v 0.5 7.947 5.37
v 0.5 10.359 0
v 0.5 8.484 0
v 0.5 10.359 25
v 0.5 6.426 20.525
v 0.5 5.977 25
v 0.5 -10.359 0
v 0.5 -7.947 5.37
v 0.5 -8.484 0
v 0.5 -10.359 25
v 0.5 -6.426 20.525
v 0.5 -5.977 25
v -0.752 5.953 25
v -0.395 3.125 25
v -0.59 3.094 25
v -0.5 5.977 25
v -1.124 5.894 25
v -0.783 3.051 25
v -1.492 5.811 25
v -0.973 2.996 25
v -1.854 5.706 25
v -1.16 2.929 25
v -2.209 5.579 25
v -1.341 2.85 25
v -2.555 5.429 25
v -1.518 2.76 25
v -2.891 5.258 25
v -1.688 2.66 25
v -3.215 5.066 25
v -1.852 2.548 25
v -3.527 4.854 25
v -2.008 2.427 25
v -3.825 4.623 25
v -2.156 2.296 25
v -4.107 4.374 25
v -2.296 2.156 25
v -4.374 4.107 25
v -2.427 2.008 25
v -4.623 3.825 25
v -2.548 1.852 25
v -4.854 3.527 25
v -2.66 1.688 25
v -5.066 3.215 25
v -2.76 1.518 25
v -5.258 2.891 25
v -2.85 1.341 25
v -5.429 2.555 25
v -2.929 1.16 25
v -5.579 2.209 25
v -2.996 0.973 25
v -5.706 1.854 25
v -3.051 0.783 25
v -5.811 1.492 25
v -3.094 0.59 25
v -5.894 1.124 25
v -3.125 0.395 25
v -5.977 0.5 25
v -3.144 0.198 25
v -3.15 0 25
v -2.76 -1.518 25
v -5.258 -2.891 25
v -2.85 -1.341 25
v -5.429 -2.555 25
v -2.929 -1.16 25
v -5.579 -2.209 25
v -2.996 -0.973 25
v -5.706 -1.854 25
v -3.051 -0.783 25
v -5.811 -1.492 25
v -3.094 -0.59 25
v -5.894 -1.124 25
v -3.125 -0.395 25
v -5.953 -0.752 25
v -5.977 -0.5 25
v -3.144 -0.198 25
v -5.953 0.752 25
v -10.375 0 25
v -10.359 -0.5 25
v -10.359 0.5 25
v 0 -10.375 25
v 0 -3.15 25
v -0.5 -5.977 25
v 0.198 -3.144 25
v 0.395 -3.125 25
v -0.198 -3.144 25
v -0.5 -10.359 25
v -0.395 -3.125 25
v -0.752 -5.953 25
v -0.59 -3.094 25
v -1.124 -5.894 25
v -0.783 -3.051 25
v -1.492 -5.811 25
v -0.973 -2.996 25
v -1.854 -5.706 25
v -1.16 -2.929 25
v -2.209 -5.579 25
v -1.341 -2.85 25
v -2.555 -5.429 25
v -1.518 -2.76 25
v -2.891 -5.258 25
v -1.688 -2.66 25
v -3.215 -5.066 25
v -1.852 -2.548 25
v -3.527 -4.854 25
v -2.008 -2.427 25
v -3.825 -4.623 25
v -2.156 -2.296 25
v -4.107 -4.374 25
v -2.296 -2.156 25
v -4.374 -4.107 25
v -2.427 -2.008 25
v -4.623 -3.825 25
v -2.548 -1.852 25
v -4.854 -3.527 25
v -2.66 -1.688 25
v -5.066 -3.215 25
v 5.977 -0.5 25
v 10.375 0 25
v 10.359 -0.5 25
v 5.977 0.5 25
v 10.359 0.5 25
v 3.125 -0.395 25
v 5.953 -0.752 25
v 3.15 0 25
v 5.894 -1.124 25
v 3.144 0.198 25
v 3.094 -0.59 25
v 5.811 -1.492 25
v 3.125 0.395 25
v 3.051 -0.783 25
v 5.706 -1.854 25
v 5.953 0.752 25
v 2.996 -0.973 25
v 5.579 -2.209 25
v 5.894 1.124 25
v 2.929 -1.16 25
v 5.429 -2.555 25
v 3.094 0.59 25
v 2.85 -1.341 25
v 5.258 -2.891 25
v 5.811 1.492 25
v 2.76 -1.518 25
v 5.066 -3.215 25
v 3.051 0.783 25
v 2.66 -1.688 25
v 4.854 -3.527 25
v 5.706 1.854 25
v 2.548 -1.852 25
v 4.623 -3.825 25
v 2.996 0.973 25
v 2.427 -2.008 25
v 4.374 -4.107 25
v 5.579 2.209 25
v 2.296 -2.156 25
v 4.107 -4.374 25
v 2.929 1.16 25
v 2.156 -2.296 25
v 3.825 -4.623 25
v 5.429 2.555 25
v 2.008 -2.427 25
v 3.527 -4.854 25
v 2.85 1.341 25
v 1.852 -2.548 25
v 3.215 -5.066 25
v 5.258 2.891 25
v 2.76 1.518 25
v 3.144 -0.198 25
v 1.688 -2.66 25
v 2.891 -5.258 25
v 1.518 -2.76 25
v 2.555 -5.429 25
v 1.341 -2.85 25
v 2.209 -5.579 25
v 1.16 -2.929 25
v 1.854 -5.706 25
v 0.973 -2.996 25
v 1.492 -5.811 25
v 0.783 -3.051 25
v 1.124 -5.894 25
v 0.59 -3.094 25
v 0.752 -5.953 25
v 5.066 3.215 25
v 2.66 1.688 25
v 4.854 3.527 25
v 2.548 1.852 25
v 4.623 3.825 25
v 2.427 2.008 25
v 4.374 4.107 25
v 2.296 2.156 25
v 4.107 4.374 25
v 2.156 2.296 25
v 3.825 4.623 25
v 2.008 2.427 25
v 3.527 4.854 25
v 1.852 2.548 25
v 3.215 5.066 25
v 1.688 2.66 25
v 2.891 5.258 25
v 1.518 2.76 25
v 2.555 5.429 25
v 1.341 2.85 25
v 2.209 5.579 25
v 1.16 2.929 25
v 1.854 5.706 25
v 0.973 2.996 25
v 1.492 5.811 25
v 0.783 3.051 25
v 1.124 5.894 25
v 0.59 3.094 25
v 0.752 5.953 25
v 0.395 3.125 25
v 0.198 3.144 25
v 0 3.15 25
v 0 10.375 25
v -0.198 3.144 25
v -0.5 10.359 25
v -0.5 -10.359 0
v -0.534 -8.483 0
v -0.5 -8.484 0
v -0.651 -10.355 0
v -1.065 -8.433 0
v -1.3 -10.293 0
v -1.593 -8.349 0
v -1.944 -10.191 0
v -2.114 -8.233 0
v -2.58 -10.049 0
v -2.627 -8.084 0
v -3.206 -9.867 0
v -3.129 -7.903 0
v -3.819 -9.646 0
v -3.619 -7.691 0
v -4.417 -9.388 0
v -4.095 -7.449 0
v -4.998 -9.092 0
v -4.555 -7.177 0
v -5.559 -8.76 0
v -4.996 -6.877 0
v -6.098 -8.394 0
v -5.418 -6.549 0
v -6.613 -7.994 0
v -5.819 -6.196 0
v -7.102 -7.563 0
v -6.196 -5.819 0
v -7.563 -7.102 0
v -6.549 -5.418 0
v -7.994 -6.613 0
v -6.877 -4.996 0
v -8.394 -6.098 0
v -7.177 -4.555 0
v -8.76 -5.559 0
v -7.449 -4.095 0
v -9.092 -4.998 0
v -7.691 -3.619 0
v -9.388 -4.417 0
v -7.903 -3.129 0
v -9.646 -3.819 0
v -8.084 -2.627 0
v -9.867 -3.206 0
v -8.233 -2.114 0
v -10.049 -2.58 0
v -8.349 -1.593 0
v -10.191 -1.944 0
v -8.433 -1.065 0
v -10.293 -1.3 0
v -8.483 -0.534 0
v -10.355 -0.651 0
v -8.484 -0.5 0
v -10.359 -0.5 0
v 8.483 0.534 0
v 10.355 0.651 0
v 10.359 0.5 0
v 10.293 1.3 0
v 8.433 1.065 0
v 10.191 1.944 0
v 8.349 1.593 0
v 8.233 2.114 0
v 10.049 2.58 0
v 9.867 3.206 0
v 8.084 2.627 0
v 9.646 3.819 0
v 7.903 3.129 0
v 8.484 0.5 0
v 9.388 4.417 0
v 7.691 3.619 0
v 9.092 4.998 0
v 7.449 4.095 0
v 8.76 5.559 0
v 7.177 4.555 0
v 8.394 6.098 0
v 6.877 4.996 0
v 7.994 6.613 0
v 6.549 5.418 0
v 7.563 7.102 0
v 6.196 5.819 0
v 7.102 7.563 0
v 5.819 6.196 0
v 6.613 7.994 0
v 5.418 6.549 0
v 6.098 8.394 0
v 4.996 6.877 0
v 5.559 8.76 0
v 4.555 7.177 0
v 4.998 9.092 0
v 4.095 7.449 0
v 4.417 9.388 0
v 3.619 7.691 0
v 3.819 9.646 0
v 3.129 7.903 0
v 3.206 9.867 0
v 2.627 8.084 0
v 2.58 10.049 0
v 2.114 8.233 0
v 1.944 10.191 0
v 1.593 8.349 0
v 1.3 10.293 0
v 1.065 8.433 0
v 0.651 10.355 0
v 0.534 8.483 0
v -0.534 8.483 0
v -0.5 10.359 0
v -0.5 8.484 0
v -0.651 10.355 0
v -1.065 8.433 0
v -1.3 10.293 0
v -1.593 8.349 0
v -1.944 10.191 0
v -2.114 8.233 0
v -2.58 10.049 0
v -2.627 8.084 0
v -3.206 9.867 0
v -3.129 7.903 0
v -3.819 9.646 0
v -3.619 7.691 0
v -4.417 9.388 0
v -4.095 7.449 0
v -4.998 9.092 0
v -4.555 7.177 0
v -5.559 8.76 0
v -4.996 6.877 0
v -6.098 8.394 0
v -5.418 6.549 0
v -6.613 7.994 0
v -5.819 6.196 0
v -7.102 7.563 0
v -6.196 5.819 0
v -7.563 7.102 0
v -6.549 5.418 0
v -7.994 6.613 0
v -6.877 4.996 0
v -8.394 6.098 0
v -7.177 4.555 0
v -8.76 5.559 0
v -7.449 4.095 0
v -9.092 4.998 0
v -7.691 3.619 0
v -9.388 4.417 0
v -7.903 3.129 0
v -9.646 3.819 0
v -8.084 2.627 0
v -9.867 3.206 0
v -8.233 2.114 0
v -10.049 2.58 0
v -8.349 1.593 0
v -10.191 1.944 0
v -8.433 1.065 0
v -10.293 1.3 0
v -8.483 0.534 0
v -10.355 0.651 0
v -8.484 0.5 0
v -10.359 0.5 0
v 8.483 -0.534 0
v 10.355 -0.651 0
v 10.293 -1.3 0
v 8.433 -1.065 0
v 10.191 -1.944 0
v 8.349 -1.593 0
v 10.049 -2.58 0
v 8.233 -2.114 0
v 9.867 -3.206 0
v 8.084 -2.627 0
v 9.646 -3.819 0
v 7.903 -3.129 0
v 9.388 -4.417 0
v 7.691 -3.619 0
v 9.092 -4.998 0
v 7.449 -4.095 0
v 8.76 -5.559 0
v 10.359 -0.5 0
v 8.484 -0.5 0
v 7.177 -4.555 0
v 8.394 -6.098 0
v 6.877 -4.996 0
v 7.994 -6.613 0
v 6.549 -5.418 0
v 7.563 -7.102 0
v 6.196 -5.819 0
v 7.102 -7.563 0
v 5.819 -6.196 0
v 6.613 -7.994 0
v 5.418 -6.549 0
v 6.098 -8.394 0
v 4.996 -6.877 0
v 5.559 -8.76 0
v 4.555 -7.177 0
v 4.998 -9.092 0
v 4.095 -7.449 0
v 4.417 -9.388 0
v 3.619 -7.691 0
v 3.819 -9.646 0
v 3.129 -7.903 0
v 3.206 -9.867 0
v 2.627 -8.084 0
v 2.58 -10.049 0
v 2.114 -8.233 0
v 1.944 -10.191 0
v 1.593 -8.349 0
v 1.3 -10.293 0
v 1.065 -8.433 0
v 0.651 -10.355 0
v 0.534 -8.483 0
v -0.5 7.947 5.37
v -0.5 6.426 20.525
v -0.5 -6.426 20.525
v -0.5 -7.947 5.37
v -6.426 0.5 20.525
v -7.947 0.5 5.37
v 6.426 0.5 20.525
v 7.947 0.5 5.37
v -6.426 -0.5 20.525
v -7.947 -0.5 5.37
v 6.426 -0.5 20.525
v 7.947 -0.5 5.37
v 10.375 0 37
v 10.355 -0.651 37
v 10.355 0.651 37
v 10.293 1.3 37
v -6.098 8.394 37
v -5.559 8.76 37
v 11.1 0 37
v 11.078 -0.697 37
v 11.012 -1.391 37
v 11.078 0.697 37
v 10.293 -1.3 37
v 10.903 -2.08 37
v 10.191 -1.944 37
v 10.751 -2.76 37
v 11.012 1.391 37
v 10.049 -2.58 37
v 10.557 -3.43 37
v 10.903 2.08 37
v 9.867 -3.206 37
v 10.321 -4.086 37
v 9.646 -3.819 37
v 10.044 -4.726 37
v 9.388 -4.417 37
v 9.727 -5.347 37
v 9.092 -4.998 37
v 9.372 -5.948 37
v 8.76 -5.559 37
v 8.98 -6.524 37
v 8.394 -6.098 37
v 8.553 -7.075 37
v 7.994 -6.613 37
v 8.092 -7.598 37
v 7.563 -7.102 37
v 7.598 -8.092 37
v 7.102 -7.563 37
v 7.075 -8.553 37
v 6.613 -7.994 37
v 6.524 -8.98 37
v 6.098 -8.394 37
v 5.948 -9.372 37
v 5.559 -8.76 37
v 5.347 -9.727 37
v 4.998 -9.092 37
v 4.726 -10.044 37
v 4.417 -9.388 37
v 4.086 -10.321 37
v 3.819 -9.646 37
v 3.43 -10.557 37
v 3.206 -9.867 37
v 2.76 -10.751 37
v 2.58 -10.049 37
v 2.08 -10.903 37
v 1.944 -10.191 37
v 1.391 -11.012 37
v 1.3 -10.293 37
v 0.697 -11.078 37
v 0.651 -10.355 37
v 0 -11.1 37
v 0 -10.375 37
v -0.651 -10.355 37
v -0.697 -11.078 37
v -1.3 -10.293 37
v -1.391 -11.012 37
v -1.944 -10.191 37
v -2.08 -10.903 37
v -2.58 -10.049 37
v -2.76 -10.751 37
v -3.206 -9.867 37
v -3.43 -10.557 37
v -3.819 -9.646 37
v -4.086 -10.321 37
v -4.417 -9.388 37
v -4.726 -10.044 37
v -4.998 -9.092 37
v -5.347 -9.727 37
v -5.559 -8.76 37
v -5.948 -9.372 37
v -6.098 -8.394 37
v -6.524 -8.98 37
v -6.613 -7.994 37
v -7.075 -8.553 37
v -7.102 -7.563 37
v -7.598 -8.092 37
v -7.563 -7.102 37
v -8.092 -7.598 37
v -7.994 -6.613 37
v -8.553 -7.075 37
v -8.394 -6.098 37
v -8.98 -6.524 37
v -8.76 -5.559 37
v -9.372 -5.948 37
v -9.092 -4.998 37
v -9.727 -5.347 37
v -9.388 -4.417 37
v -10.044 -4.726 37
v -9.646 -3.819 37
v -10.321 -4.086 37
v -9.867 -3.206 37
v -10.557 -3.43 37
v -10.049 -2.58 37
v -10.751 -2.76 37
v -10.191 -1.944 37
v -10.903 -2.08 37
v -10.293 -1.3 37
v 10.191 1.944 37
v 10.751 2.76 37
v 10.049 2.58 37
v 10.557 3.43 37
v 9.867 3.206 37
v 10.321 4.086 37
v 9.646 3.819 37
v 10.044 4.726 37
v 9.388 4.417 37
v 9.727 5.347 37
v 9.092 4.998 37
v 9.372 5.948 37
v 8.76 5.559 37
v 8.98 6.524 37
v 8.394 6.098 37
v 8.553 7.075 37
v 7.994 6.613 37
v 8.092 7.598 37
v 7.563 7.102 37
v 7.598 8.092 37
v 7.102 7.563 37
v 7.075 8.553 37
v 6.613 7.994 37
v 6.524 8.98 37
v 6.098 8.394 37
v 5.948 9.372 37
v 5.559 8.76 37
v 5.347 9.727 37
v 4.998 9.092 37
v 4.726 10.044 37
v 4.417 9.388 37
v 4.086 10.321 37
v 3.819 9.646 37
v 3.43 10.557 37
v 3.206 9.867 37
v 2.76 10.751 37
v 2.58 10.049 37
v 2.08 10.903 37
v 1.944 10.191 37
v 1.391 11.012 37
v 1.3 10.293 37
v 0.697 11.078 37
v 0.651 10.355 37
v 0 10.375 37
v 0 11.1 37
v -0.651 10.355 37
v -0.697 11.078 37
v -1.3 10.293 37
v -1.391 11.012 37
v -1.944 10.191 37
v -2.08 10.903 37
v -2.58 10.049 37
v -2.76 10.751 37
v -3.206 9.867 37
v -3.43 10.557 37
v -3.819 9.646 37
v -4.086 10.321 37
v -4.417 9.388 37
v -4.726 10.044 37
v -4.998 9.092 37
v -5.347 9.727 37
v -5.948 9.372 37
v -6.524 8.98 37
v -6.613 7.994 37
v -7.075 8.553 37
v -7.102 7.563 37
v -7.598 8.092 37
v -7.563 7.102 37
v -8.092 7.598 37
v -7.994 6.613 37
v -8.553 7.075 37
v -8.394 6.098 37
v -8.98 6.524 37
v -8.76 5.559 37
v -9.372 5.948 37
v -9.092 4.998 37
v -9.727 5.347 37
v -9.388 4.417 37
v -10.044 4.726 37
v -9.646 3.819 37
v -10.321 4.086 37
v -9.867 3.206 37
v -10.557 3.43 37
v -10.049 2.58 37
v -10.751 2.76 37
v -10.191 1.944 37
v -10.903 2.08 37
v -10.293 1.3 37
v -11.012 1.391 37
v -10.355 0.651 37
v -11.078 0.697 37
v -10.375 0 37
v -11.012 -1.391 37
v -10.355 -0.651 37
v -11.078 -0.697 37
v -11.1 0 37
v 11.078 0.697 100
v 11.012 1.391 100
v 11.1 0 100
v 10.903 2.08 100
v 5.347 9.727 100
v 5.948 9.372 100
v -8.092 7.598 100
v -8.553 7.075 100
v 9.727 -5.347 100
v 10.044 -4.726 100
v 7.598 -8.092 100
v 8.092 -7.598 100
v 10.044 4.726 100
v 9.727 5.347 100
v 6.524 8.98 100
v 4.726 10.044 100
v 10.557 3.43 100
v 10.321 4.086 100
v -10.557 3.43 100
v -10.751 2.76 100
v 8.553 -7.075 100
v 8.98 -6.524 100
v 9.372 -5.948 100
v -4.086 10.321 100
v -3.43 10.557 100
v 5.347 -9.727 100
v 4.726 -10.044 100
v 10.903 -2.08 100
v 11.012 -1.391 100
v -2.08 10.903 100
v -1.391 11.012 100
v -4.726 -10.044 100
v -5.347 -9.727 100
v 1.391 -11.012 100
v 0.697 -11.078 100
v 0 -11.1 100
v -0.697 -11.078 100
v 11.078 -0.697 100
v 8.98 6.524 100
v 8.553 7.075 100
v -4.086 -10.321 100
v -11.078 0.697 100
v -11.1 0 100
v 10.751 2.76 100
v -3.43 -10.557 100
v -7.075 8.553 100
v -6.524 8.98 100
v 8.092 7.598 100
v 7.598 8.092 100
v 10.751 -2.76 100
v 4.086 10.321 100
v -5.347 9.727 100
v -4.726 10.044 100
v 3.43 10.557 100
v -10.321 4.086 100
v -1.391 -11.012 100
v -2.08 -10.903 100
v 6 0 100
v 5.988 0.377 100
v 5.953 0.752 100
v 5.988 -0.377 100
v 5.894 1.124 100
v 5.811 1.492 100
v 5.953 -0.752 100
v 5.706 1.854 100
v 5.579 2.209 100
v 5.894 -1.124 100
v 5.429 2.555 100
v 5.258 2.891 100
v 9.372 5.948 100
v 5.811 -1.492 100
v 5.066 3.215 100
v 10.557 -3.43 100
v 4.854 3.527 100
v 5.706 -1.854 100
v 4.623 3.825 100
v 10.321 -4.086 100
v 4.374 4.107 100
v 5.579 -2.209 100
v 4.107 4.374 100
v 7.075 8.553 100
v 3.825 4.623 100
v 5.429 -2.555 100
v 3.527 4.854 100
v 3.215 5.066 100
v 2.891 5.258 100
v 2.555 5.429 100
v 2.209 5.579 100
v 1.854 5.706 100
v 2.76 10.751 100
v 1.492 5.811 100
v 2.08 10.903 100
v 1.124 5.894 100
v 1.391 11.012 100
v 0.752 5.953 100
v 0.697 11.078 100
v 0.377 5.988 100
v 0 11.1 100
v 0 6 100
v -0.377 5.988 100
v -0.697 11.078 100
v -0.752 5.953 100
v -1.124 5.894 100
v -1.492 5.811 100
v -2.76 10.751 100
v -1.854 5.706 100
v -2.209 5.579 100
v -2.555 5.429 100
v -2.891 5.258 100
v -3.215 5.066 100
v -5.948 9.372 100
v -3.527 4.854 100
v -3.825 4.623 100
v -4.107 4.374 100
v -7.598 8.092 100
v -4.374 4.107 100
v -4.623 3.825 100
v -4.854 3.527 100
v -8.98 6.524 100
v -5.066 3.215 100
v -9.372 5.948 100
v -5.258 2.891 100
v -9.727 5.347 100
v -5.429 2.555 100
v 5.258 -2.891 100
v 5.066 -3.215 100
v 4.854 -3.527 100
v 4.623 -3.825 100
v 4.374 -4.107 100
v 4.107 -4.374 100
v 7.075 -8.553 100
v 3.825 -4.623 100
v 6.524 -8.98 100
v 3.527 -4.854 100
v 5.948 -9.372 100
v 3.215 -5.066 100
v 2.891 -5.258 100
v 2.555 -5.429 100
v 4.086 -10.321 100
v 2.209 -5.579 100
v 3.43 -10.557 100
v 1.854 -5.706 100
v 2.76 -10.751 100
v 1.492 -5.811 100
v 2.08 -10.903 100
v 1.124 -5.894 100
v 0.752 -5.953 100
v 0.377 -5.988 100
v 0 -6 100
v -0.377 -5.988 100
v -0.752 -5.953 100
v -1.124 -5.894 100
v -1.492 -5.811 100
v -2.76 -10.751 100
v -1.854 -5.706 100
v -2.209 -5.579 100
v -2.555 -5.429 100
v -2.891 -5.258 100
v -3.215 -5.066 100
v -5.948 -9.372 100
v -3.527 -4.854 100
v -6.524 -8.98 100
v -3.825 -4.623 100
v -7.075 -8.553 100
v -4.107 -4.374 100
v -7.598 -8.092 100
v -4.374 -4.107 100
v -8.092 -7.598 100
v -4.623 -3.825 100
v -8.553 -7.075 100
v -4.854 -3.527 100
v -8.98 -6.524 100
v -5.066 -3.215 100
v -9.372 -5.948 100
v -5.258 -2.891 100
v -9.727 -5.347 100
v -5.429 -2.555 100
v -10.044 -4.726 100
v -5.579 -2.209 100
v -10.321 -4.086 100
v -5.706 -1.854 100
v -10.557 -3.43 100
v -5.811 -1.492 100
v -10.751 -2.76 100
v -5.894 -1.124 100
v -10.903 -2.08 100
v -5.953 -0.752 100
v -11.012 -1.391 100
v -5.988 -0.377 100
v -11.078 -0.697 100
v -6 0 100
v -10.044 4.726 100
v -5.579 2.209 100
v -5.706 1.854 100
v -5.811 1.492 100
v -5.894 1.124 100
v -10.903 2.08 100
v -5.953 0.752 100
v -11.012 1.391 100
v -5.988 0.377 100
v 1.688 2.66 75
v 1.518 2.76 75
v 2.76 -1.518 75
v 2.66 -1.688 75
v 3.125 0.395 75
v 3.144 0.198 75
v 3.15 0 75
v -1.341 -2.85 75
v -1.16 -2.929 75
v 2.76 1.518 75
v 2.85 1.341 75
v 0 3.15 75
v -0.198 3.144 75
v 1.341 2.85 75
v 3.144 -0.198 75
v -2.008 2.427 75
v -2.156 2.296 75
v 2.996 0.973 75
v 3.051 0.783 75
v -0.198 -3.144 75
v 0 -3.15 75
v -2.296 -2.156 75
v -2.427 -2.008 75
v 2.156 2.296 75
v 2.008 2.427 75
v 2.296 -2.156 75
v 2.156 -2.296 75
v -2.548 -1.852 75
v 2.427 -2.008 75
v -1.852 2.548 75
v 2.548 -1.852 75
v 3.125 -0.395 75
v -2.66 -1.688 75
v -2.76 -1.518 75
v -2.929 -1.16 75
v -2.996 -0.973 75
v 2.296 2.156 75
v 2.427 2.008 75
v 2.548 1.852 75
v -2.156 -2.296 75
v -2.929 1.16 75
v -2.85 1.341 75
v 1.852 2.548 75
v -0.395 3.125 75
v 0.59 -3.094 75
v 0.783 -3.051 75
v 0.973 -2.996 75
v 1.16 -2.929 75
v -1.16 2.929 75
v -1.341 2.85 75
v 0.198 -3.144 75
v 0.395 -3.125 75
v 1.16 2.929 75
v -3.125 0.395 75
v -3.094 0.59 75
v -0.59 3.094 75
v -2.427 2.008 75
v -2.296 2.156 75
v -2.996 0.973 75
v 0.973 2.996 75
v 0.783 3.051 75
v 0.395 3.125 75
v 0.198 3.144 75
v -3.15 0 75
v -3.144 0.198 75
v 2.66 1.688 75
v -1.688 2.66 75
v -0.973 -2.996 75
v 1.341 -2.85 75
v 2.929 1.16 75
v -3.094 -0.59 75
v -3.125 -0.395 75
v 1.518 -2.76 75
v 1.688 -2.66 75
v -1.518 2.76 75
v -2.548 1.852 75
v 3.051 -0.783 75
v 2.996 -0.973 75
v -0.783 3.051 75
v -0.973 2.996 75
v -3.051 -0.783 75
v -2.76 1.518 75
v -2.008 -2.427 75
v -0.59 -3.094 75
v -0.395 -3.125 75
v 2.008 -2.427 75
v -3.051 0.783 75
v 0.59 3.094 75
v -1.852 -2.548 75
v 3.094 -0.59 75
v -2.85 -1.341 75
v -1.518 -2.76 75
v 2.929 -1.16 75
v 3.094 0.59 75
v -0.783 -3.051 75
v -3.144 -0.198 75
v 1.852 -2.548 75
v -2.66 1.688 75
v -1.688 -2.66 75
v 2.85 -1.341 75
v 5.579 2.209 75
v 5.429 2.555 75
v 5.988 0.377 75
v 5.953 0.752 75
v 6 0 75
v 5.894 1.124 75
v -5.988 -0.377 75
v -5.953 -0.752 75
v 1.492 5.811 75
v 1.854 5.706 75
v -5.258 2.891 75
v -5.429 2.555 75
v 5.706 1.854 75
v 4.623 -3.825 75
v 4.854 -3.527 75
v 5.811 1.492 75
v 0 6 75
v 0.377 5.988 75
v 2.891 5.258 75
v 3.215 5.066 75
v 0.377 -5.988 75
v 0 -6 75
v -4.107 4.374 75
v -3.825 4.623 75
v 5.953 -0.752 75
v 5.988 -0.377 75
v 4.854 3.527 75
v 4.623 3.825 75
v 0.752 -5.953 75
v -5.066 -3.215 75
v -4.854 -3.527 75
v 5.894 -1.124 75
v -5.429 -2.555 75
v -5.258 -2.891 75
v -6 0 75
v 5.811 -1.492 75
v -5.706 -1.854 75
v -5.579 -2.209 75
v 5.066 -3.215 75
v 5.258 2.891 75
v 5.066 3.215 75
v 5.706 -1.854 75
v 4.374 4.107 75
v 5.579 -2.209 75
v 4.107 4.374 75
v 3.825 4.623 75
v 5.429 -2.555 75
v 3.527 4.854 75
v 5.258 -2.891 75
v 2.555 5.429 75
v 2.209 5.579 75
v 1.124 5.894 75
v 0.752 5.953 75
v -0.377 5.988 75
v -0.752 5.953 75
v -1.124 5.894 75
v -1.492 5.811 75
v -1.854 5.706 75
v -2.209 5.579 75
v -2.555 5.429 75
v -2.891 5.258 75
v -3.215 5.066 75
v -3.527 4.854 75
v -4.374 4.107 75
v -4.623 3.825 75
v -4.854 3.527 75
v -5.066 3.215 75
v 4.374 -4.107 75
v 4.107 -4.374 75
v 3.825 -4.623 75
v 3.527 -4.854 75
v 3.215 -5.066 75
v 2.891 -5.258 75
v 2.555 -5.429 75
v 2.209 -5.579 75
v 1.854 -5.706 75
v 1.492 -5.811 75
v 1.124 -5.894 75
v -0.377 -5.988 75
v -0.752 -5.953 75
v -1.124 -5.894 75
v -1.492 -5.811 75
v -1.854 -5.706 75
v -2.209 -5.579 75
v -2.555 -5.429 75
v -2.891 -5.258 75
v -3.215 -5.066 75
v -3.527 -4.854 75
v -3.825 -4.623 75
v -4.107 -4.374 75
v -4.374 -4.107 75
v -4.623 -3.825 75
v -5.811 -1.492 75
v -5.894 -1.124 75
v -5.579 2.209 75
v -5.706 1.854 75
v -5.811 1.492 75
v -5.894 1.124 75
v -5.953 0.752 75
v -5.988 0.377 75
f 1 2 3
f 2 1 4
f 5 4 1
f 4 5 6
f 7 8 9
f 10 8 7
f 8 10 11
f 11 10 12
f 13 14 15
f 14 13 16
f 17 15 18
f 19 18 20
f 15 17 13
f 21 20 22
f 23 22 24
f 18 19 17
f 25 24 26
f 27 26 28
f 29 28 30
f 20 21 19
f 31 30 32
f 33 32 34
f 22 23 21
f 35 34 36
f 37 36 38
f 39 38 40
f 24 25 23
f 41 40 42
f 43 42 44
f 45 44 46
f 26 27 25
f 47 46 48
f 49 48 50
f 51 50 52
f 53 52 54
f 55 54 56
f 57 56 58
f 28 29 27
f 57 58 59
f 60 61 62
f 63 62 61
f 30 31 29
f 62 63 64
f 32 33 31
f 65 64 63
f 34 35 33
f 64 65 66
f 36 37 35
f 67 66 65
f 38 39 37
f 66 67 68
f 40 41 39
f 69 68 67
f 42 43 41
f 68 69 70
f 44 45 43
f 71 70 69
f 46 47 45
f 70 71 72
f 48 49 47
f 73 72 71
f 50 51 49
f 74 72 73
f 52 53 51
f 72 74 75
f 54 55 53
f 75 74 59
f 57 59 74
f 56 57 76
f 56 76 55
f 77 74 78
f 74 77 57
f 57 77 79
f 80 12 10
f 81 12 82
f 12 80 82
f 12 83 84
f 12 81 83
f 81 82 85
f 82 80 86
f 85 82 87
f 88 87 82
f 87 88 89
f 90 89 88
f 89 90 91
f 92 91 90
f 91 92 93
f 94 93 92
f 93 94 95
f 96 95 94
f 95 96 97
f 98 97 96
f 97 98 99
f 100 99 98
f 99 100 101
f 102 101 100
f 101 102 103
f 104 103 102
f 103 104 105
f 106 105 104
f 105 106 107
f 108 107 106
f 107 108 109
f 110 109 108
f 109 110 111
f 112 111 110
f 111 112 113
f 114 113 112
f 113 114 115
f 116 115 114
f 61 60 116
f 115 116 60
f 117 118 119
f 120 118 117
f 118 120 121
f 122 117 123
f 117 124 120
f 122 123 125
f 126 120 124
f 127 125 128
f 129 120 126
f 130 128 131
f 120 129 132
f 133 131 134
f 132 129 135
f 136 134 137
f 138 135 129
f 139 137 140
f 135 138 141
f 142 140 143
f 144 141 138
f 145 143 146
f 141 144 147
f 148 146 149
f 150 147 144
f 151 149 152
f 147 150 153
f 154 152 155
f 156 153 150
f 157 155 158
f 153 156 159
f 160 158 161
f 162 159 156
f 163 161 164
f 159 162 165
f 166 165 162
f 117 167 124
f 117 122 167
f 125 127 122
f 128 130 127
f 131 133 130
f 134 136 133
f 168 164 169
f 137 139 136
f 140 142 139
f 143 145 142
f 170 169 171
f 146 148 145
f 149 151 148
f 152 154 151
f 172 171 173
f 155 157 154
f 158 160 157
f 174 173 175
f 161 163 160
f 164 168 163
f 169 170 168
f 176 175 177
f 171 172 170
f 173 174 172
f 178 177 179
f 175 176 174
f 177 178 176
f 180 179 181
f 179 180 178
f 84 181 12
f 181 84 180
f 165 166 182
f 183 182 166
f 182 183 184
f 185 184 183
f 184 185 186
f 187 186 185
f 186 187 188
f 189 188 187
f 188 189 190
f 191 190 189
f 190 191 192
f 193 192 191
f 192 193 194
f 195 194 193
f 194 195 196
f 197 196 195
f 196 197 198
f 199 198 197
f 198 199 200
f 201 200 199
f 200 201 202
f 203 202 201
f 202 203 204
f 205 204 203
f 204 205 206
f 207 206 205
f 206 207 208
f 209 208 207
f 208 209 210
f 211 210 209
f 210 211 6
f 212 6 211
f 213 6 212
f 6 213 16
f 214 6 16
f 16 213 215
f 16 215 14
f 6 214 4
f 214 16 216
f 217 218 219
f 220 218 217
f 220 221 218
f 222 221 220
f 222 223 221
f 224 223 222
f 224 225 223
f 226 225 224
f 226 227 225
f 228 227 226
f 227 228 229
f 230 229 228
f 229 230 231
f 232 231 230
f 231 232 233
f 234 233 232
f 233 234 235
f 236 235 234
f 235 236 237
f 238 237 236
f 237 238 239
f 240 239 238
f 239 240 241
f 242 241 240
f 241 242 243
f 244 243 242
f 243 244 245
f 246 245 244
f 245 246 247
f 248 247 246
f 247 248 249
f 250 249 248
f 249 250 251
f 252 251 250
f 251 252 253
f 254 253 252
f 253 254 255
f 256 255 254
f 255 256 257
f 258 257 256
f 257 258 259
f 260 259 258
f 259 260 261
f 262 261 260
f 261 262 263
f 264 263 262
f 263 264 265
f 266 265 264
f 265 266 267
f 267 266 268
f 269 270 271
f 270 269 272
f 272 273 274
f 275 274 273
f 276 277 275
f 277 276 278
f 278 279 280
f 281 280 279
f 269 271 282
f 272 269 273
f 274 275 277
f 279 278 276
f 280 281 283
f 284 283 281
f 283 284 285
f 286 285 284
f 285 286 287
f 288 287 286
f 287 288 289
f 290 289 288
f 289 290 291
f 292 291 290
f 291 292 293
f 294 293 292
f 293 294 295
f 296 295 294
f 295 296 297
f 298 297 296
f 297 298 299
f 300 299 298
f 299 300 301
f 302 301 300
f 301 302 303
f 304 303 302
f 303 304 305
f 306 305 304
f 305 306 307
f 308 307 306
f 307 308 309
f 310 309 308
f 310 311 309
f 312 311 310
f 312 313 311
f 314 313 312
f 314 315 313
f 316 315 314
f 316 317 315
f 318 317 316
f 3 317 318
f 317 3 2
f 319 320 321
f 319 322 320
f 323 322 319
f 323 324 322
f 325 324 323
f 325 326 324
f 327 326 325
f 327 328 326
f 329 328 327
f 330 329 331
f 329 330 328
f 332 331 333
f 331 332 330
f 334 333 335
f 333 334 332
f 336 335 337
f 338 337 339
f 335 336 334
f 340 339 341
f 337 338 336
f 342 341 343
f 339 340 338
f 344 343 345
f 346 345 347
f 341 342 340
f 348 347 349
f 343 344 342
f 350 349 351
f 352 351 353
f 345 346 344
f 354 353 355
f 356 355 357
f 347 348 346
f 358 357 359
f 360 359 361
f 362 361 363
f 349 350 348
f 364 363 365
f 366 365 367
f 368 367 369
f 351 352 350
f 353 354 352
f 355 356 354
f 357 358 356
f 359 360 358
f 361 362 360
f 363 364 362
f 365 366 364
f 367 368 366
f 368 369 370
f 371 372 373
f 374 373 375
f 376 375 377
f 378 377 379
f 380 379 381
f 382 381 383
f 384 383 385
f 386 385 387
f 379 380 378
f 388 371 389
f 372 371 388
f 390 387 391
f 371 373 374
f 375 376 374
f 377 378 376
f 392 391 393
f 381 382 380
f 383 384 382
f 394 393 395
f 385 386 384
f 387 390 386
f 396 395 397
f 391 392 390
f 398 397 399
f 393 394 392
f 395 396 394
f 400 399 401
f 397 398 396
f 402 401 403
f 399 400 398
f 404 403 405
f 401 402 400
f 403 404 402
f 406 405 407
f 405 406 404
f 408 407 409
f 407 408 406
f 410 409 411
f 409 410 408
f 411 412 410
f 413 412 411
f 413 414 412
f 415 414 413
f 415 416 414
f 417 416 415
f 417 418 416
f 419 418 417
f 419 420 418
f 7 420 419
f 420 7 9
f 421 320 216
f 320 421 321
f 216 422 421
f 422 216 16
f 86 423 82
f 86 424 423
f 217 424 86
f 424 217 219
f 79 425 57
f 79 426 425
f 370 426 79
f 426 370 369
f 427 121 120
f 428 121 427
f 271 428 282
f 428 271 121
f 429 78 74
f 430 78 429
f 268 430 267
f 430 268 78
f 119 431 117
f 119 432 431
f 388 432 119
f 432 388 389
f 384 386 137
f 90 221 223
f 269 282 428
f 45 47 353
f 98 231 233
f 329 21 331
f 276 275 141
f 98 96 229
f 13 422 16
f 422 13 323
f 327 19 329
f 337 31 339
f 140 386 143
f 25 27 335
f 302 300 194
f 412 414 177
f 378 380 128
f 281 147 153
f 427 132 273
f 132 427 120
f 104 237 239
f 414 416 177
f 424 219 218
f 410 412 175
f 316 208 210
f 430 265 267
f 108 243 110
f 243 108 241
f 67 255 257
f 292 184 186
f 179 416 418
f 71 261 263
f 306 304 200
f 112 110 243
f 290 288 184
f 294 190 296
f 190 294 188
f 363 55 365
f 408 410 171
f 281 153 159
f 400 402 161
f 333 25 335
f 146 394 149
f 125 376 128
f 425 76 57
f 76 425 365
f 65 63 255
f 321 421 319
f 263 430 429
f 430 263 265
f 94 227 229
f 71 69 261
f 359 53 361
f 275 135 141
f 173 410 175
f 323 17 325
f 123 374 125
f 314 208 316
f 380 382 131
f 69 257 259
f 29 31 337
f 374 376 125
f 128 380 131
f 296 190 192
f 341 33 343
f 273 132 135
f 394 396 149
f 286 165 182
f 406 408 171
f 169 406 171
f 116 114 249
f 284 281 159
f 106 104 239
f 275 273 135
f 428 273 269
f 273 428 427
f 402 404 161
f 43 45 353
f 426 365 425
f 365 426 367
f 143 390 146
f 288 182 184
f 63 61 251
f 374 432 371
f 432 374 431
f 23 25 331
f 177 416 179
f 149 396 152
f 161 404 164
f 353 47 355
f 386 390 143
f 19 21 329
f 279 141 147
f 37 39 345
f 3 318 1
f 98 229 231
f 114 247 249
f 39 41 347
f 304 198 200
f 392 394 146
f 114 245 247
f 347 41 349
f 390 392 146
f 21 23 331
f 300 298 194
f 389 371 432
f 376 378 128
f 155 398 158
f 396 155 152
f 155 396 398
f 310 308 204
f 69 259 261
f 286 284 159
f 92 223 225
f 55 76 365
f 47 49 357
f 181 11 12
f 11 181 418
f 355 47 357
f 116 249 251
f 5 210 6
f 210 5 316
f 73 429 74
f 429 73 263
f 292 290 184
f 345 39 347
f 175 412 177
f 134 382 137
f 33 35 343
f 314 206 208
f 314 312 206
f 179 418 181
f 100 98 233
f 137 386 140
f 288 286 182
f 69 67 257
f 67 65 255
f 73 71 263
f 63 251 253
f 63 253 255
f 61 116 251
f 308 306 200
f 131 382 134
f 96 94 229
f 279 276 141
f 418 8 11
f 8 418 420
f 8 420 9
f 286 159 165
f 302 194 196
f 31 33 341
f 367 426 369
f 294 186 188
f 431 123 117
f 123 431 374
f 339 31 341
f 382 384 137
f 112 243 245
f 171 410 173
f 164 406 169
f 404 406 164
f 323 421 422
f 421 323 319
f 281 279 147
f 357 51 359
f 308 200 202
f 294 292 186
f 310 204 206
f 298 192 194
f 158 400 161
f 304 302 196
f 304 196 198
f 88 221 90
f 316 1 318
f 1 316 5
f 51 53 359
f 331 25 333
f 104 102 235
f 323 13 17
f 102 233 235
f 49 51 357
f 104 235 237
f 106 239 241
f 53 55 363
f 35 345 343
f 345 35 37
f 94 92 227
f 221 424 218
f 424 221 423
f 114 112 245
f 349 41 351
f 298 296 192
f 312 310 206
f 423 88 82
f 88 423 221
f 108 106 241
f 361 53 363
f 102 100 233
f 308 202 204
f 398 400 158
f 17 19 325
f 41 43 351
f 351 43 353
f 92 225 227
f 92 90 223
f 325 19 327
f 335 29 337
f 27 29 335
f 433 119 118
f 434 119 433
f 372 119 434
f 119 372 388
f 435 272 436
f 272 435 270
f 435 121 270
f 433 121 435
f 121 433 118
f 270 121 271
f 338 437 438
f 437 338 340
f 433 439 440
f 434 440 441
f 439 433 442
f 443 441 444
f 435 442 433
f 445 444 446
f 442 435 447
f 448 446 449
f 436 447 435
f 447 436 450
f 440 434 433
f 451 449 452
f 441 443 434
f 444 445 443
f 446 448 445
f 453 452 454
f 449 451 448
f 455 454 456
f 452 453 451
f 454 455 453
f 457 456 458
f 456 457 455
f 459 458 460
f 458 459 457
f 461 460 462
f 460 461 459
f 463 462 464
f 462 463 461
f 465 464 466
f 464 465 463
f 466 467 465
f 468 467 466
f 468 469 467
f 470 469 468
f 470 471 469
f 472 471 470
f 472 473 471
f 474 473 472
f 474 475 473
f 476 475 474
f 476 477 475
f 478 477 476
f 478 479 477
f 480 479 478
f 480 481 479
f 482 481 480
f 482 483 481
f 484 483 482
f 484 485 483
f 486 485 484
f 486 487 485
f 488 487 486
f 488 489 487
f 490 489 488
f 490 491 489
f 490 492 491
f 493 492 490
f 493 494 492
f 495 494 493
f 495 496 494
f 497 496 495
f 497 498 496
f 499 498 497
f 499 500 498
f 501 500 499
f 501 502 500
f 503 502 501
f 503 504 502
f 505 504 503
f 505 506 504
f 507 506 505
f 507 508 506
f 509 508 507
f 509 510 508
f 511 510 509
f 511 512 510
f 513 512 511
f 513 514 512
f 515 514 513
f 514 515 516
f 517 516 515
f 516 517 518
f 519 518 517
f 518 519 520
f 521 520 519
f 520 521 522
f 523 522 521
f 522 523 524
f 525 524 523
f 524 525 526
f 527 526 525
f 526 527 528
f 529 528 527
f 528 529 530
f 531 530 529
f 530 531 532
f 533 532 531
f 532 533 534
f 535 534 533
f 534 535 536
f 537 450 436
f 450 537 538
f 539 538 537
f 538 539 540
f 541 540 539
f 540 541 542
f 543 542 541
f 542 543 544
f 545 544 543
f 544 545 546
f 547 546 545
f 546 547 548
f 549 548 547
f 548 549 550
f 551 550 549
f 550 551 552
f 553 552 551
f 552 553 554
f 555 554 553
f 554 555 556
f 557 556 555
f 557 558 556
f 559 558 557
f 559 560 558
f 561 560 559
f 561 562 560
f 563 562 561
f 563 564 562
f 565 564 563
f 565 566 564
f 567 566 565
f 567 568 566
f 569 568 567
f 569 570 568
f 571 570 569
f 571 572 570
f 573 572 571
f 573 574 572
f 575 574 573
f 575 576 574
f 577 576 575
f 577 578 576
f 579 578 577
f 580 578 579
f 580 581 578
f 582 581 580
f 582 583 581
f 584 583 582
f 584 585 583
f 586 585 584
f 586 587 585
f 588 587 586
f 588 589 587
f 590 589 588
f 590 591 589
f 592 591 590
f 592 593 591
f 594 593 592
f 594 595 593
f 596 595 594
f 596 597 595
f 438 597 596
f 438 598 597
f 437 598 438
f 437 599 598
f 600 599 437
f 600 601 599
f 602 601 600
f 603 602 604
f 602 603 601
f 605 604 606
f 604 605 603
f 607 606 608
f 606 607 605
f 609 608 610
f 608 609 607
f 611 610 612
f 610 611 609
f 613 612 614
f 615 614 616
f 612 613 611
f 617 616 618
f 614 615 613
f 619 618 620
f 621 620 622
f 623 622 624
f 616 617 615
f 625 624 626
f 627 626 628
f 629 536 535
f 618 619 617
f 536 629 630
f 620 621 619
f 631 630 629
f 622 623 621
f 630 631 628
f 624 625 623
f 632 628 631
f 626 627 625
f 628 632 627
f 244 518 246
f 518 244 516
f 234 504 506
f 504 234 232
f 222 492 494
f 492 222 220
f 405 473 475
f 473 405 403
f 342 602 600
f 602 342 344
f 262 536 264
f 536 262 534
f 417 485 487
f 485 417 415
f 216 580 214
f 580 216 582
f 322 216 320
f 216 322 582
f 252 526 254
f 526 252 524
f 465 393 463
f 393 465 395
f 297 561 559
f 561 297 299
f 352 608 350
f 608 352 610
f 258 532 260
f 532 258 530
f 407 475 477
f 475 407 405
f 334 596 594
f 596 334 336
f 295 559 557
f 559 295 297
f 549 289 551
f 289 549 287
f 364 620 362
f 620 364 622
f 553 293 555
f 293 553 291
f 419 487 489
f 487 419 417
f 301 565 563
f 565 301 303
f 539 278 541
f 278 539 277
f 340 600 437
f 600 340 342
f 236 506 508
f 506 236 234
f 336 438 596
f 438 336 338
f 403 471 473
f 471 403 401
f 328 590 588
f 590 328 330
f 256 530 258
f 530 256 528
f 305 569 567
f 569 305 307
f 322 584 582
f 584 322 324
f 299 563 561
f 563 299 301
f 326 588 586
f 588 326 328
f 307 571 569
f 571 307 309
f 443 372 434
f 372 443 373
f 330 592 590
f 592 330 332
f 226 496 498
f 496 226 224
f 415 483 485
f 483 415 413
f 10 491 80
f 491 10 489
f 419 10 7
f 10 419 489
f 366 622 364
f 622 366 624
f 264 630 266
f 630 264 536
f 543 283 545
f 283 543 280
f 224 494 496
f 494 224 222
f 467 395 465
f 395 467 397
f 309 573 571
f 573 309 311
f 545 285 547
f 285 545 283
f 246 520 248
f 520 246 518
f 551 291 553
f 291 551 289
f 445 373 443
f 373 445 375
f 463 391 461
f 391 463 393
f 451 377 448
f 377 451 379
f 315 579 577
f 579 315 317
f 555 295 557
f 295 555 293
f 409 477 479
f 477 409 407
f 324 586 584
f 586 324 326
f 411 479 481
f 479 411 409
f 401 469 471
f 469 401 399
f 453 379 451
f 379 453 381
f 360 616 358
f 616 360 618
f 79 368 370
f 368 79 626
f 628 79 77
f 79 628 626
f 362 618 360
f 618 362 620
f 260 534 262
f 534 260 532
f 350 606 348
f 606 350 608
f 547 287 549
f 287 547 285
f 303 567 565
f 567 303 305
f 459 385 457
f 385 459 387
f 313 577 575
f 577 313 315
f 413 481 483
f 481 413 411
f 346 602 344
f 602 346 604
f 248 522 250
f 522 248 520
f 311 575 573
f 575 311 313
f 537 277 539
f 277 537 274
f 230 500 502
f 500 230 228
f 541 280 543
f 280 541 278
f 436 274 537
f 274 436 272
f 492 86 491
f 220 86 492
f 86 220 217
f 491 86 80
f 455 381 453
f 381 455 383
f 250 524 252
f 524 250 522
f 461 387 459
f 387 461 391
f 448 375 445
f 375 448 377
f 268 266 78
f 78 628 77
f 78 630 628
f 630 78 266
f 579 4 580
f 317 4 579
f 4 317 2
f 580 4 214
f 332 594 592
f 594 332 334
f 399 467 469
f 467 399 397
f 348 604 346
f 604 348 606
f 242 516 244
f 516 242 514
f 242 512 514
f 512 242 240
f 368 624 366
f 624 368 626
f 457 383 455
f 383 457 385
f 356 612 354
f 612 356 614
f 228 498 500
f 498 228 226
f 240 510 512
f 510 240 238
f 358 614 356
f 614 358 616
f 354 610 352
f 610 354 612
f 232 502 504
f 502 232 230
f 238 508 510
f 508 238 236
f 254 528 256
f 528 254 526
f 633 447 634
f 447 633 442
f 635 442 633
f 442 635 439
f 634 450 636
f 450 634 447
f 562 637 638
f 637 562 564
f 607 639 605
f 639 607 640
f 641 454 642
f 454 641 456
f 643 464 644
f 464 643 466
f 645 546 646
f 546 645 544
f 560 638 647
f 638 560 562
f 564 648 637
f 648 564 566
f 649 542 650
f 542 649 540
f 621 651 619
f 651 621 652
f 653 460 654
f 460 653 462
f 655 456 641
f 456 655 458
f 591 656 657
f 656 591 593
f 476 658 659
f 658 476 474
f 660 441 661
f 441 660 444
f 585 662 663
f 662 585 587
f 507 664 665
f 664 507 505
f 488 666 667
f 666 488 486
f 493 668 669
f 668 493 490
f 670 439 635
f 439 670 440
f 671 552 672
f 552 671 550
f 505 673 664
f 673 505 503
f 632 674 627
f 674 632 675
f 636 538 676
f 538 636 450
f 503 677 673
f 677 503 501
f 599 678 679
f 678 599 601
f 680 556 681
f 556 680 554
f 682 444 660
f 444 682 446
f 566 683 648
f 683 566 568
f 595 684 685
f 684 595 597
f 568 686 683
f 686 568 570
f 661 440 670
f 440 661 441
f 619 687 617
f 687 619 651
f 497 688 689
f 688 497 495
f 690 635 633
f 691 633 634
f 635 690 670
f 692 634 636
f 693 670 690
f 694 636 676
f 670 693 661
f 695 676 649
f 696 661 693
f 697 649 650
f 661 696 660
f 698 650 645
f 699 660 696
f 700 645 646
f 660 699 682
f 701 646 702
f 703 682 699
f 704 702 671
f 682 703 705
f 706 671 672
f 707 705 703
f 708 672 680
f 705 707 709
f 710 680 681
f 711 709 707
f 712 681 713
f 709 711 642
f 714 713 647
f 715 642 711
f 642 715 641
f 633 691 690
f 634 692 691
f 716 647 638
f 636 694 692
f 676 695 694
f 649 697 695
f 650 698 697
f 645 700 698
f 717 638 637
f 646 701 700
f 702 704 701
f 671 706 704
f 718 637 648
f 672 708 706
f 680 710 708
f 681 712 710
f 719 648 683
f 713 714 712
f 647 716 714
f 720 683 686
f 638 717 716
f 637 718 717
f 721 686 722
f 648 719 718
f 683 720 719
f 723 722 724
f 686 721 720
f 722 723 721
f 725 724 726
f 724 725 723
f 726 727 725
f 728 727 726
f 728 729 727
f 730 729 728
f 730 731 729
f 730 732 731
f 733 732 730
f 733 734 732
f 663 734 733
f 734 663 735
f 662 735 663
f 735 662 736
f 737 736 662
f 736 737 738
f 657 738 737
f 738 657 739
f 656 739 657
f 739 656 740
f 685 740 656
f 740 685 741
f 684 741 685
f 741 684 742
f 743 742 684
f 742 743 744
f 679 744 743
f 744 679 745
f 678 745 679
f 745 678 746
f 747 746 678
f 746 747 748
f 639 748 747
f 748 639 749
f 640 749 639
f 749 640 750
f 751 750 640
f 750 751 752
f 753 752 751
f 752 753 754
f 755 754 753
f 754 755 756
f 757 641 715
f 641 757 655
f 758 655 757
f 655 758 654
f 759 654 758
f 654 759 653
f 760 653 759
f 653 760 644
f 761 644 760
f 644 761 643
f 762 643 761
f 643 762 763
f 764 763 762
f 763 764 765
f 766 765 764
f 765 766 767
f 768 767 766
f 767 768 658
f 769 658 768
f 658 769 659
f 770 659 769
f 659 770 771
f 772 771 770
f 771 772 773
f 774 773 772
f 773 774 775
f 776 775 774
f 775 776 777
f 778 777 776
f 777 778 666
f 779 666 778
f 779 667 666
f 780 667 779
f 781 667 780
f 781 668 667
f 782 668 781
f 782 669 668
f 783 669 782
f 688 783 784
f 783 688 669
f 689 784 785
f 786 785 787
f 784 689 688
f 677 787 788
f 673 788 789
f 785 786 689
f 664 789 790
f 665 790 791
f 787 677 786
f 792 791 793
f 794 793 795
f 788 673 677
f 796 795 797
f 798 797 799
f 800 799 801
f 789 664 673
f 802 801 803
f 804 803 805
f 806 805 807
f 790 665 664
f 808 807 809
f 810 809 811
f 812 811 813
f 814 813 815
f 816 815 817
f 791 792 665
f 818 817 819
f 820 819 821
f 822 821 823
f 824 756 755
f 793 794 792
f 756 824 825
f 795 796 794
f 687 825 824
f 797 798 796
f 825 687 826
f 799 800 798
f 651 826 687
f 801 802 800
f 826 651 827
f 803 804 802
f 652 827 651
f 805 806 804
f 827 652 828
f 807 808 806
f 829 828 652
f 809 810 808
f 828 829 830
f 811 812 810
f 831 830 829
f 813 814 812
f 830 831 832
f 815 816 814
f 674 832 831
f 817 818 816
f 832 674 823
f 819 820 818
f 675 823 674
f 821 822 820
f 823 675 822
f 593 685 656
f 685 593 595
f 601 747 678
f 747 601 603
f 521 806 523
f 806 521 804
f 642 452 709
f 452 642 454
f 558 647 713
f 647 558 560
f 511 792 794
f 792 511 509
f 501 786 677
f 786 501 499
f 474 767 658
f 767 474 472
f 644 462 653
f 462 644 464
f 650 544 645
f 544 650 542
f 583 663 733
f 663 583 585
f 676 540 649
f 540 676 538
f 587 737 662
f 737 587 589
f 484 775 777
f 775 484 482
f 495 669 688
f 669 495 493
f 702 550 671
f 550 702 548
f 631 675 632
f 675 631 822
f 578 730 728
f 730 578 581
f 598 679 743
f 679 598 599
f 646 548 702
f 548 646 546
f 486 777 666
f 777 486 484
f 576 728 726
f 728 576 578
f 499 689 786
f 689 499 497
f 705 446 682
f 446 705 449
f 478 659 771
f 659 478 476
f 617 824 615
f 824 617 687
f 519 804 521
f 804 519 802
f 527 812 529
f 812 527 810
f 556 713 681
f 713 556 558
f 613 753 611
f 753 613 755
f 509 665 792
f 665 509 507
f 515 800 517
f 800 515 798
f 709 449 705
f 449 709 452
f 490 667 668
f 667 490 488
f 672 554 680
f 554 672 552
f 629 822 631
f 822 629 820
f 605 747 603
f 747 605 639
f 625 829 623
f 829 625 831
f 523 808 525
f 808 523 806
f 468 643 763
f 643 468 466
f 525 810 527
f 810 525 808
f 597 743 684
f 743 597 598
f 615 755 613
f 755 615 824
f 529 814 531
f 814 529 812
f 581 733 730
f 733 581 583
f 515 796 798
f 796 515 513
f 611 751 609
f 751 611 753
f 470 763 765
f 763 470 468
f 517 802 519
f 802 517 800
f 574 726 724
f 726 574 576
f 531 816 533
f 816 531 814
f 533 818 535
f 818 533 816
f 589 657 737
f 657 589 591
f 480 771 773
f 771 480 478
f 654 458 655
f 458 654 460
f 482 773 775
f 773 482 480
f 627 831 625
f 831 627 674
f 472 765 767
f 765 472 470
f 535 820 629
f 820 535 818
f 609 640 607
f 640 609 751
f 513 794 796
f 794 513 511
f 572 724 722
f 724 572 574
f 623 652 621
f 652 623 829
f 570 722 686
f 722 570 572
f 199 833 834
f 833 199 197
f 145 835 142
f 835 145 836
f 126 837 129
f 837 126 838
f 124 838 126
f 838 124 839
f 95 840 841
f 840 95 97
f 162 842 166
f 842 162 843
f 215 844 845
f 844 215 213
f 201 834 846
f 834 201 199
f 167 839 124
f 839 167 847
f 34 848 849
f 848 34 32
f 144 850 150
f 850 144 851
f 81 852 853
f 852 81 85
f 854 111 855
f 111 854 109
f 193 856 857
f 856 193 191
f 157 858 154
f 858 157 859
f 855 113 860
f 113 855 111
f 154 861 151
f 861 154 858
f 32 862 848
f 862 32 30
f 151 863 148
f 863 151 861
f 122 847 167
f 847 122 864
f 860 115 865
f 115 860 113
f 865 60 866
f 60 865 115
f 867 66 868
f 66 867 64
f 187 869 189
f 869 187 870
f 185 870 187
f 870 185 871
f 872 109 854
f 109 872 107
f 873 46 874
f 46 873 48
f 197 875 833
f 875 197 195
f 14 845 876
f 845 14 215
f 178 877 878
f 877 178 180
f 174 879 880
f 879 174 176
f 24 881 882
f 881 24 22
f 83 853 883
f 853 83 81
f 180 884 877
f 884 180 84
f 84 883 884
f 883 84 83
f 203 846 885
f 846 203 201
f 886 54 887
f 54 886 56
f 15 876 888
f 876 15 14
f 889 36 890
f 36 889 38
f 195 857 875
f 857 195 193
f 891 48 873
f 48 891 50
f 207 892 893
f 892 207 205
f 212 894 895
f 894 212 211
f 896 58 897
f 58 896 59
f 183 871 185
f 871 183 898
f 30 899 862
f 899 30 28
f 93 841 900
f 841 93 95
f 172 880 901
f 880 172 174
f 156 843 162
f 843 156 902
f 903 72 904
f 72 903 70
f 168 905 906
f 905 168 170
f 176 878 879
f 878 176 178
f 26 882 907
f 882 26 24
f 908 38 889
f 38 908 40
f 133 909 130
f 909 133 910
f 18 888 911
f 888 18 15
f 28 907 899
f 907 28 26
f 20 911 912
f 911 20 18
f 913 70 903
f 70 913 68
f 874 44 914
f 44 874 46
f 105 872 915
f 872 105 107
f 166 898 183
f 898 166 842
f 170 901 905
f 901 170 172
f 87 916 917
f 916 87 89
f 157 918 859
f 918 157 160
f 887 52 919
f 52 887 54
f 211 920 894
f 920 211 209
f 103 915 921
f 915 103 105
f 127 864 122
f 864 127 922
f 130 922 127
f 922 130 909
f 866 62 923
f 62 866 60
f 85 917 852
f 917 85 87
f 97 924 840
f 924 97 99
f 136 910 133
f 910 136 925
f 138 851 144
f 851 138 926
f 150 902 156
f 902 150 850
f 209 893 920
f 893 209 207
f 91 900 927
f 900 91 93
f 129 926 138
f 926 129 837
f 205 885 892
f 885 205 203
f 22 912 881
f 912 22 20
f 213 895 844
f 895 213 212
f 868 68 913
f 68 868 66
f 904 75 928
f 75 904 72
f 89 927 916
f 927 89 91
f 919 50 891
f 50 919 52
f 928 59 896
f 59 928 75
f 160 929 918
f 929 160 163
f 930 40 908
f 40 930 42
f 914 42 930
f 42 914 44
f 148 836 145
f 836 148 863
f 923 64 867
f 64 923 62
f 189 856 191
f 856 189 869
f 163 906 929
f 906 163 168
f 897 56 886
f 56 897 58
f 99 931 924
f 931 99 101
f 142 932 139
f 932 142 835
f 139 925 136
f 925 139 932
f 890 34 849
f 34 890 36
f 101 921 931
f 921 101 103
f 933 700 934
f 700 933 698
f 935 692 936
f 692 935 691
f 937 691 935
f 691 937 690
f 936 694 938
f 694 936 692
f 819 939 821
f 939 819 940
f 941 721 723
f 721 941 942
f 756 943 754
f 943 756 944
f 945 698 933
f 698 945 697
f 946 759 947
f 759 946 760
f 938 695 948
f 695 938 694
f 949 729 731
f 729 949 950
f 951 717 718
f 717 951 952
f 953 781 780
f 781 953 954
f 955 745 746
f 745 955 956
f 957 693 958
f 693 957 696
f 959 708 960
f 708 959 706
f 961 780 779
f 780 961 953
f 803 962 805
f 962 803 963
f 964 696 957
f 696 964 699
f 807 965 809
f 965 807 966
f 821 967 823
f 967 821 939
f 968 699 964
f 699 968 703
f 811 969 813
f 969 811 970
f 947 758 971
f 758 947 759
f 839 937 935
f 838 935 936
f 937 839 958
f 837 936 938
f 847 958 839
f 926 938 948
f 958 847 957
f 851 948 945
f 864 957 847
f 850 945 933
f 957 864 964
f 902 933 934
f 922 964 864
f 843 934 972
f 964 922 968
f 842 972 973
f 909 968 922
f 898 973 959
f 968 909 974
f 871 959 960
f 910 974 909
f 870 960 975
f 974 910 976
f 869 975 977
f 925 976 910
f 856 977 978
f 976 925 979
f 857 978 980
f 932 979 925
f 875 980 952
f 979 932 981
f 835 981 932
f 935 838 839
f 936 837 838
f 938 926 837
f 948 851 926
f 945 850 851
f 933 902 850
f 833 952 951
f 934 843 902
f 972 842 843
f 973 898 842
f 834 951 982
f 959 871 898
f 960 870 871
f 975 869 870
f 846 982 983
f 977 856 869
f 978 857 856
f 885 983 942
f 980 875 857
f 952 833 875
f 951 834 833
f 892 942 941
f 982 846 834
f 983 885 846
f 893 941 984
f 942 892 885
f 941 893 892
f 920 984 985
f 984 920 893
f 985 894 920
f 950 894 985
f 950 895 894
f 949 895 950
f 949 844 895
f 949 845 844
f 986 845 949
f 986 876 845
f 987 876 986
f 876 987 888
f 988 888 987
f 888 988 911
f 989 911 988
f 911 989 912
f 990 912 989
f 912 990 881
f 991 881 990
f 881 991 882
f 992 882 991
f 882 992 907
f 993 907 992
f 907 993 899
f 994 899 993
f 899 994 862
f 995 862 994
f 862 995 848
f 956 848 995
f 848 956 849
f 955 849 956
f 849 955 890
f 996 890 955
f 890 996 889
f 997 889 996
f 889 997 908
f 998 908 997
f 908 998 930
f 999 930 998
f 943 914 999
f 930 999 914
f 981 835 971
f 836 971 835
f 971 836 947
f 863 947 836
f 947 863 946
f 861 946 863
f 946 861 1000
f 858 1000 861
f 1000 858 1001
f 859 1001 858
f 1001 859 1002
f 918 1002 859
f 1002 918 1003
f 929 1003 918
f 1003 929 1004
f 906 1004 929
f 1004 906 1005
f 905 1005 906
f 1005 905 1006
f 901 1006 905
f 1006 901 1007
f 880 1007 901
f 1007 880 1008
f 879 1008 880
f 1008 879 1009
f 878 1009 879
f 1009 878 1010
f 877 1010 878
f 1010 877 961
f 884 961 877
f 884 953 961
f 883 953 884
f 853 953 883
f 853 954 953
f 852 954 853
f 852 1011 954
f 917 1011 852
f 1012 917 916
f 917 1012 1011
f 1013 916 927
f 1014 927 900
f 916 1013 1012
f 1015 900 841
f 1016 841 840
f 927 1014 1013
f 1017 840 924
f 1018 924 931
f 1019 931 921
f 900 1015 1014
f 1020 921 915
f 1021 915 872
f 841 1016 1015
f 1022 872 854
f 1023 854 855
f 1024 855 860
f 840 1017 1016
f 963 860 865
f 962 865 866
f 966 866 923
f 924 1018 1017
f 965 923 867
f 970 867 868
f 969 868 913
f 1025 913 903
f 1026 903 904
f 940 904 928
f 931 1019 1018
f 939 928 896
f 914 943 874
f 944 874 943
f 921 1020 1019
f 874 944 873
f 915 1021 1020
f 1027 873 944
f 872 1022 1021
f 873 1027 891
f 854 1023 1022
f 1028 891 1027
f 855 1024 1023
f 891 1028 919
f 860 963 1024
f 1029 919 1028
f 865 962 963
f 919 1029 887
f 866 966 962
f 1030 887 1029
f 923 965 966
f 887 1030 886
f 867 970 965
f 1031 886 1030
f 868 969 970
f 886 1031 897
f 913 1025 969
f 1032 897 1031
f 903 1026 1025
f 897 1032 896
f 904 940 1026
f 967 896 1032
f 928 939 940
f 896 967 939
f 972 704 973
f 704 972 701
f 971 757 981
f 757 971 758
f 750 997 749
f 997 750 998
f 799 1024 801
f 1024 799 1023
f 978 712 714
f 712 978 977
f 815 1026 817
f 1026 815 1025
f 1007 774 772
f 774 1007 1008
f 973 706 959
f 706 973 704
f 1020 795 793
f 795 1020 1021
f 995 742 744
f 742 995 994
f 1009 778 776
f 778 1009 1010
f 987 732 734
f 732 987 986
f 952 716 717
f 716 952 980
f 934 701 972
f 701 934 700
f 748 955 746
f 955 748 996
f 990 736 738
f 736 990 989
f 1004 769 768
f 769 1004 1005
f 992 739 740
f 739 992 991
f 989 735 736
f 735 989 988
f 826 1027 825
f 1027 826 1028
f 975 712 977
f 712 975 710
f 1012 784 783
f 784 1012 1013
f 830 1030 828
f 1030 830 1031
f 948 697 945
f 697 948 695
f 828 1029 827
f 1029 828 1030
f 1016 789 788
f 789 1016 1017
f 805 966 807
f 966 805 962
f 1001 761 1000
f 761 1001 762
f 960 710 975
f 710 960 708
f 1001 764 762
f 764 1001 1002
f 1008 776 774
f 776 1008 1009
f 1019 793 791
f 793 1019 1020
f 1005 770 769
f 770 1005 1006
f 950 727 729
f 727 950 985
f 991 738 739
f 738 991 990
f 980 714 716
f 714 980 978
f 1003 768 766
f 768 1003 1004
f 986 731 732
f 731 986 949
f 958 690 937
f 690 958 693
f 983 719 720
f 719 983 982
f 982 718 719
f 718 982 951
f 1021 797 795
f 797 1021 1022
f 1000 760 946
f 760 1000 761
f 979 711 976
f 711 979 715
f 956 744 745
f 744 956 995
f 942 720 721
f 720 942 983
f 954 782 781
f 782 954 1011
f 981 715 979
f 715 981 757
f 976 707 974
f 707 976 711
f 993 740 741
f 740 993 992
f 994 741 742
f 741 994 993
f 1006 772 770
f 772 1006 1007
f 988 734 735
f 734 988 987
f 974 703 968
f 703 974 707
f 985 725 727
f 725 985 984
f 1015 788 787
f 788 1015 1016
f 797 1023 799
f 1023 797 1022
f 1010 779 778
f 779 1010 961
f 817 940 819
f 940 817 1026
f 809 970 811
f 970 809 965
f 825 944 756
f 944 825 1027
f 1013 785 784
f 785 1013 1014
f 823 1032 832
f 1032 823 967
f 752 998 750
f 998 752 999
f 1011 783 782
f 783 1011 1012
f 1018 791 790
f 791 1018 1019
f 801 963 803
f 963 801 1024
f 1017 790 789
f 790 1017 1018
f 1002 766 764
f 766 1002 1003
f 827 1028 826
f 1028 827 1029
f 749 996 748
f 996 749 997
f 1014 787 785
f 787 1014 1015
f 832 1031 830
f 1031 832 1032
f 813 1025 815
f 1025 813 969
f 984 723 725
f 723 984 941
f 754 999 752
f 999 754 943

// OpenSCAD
$fn = 100;
h1 = 25; //height of plug insert hole
s1 = 1; //width of slot in insert
i1 = 37; //insert portion height
sd = 6.3; //fixing bolt diameter
sh1 = 12; //fixing bolt head diameter
sh2 = 40; //fixing bolt head depth

difference() {
main_assembly();
screw_hole();
}

module main_assembly() {
shifter_mount();
difference() {
bar_insert();
bar_insert_cutout();
}
}

module shifter_mount() {
translate([0,0,i1])
cylinder(h=63, d=22.2);  
}

module screw_hole() {
cylinder(h=100, d=sd);
translate([0,0,75])
cylinder(h=sh2, d=sh1);
}

module bar_insert() {
  cylinder(h=i1, d=20.75);
}  

module bar_insert_cutout() {
translate([0,0,h1/2])
union(){
cube(size=[s1,21,h1], center=true);

cube(size=[21,s1,h1], center=true);
    
cylinder(h=h1, d1=17, d2=12,center=true);    
    }
}
